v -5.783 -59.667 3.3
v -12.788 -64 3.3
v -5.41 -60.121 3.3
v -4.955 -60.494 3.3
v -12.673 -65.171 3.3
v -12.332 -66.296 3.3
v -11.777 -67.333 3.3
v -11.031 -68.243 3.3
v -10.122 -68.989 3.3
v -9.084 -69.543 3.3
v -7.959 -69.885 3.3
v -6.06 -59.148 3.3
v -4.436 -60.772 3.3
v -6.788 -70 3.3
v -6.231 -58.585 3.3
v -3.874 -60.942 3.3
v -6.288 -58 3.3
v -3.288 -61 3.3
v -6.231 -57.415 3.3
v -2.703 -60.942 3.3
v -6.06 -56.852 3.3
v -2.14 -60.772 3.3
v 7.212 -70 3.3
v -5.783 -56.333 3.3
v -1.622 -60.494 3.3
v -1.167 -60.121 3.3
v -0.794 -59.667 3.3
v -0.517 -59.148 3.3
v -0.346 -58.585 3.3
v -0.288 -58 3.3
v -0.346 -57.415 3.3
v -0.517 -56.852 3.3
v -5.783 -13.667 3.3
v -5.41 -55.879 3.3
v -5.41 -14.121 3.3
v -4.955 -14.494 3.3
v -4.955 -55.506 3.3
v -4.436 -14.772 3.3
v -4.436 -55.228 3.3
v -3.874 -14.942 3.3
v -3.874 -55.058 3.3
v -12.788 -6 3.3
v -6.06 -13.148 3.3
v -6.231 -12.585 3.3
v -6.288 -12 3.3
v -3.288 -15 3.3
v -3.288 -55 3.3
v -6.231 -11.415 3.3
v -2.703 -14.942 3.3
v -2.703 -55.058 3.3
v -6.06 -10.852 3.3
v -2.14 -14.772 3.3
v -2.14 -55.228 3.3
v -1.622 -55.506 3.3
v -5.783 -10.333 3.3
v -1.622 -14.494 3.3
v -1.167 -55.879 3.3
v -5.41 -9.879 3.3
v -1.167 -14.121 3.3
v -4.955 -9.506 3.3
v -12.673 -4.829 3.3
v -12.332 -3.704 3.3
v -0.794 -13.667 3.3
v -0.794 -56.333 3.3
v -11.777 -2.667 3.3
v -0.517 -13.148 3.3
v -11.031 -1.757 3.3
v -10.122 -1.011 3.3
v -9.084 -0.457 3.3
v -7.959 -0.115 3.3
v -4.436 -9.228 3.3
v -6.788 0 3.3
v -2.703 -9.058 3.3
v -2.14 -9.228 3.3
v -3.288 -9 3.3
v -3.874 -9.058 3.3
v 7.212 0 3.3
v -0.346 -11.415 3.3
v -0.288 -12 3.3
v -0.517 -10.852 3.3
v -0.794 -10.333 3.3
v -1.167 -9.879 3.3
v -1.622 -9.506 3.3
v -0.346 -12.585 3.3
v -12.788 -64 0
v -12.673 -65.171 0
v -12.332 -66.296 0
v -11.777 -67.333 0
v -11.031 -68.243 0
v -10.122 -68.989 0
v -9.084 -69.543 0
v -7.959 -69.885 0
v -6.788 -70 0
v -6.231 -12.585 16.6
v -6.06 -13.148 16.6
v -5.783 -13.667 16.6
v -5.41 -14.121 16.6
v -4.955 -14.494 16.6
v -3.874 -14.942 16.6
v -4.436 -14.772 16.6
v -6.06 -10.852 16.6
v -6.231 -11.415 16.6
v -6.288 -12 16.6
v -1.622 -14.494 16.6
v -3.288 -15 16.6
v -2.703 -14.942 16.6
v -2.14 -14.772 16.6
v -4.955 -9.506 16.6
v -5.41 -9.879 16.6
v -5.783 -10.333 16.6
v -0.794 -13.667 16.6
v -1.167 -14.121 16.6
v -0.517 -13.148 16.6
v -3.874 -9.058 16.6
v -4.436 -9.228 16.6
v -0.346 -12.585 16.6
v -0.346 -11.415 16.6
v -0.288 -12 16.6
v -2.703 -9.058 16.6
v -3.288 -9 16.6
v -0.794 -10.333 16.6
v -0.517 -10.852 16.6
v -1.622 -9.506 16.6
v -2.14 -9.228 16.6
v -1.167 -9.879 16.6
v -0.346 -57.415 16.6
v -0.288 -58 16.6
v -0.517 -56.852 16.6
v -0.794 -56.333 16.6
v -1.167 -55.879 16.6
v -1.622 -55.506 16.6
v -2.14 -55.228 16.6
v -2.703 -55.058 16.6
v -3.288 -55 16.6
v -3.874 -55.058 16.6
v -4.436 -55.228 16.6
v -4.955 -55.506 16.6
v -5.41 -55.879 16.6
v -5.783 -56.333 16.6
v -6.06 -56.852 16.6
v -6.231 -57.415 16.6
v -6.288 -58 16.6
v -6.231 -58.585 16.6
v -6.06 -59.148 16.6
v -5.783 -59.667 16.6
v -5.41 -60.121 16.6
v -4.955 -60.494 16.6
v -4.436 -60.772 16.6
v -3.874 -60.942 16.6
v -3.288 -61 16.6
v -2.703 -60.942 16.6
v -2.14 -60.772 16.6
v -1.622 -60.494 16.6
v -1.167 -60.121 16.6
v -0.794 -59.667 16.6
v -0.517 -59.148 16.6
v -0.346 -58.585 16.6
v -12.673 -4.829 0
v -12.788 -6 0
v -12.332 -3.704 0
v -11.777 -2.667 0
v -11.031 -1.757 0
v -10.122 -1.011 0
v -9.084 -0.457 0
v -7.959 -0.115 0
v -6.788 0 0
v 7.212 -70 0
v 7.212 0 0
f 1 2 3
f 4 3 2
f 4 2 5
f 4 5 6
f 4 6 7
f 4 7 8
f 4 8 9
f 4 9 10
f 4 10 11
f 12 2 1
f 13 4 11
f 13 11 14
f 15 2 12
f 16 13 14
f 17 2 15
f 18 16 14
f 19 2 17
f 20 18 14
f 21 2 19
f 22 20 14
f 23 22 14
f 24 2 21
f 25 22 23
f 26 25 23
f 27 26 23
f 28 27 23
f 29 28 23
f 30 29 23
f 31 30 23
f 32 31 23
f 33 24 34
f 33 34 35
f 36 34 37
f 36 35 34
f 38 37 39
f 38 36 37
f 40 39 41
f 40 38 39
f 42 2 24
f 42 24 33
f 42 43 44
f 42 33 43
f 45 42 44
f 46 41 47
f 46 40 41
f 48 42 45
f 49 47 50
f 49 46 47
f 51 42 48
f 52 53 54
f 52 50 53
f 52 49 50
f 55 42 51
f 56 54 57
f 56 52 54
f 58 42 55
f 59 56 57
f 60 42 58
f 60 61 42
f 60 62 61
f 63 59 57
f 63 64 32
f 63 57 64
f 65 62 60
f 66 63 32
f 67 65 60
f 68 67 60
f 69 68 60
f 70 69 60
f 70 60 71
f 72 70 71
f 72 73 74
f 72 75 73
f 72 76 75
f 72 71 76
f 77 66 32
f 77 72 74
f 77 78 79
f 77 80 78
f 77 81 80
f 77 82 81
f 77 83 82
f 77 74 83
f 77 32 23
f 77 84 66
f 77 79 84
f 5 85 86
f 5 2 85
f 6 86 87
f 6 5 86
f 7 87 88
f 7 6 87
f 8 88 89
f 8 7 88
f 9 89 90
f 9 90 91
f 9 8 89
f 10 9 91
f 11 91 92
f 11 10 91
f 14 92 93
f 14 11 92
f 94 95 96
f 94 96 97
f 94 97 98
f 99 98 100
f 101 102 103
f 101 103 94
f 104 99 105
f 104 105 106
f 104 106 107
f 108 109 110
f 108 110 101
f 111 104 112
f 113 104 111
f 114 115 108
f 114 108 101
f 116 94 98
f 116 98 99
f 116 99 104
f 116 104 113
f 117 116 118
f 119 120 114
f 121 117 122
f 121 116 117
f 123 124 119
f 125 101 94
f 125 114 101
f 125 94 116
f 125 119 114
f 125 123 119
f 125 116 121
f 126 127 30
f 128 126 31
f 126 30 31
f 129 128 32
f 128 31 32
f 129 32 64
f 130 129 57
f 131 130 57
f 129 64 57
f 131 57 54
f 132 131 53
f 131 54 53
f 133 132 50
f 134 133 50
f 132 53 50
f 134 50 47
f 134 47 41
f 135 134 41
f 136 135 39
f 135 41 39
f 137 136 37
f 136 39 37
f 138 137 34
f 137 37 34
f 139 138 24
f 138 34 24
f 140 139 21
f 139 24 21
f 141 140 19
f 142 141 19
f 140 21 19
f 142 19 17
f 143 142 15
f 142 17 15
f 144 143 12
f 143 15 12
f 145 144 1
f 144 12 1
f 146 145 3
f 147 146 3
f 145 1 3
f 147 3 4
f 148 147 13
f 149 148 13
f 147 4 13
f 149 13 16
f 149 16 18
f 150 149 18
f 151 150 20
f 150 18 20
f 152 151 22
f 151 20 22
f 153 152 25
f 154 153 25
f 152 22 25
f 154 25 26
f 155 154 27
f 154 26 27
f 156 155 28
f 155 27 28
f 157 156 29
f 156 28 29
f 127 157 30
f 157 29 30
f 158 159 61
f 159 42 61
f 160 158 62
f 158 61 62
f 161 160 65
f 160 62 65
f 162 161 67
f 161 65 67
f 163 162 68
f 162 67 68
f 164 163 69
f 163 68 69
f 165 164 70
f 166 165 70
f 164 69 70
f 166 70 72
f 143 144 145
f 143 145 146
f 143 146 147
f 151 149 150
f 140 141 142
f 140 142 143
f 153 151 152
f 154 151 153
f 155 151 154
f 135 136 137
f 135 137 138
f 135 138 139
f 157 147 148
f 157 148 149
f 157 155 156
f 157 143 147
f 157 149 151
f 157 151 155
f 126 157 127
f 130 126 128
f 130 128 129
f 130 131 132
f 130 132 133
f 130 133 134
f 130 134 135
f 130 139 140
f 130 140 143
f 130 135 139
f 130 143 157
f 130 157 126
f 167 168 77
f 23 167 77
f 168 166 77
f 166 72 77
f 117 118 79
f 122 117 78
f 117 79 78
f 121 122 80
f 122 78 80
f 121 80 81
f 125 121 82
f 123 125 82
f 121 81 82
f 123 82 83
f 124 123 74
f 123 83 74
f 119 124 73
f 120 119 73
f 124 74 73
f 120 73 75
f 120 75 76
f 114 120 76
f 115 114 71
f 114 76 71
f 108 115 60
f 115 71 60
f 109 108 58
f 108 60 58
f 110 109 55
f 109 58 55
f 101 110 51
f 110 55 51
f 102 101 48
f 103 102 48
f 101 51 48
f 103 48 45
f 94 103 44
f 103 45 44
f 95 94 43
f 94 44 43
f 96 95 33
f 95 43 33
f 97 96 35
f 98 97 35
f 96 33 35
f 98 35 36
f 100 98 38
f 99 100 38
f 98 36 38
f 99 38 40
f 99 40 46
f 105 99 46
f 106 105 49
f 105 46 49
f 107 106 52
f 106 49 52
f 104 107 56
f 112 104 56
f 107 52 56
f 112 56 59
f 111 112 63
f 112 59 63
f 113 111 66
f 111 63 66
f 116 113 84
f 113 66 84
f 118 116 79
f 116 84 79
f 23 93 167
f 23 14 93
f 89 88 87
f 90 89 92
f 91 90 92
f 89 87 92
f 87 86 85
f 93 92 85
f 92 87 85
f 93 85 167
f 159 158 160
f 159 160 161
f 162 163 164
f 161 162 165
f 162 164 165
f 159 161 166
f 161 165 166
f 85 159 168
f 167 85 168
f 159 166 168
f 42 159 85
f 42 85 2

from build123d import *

# Parameters (mm, degrees)
F0_W     = 20
F0_H     = 3.3
F1_DEPTH = 70
F2_R     = 3
F3_DEPTH = 13.3
F4_R     = 6


with BuildPart() as f1:
    # F0 (on Front) → F1 (new body)
    with BuildSketch(Plane.XZ):
        with Locations((-2.78839, 1.65)):
            Rectangle(F0_W, F0_H)
    extrude(amount=F1_DEPTH)

    # F2 (on face) → F3 (join)
    with BuildSketch(Plane.XY.offset(3.3)):
        with Locations((-3.28839, -12)):
            Circle(F2_R)
        with Locations((-3.28839, -58)):
            Circle(F2_R)
    extrude(amount=F3_DEPTH)

    # F4
    f4_edges = [f1.edges().sort_by_distance(p)[0] for p in [
        (-12.78839, 0, 1.65),
        (-12.78839, -70, 1.65),
    ]]
    fillet(f4_edges, radius=F4_R)


solid = f1.part
